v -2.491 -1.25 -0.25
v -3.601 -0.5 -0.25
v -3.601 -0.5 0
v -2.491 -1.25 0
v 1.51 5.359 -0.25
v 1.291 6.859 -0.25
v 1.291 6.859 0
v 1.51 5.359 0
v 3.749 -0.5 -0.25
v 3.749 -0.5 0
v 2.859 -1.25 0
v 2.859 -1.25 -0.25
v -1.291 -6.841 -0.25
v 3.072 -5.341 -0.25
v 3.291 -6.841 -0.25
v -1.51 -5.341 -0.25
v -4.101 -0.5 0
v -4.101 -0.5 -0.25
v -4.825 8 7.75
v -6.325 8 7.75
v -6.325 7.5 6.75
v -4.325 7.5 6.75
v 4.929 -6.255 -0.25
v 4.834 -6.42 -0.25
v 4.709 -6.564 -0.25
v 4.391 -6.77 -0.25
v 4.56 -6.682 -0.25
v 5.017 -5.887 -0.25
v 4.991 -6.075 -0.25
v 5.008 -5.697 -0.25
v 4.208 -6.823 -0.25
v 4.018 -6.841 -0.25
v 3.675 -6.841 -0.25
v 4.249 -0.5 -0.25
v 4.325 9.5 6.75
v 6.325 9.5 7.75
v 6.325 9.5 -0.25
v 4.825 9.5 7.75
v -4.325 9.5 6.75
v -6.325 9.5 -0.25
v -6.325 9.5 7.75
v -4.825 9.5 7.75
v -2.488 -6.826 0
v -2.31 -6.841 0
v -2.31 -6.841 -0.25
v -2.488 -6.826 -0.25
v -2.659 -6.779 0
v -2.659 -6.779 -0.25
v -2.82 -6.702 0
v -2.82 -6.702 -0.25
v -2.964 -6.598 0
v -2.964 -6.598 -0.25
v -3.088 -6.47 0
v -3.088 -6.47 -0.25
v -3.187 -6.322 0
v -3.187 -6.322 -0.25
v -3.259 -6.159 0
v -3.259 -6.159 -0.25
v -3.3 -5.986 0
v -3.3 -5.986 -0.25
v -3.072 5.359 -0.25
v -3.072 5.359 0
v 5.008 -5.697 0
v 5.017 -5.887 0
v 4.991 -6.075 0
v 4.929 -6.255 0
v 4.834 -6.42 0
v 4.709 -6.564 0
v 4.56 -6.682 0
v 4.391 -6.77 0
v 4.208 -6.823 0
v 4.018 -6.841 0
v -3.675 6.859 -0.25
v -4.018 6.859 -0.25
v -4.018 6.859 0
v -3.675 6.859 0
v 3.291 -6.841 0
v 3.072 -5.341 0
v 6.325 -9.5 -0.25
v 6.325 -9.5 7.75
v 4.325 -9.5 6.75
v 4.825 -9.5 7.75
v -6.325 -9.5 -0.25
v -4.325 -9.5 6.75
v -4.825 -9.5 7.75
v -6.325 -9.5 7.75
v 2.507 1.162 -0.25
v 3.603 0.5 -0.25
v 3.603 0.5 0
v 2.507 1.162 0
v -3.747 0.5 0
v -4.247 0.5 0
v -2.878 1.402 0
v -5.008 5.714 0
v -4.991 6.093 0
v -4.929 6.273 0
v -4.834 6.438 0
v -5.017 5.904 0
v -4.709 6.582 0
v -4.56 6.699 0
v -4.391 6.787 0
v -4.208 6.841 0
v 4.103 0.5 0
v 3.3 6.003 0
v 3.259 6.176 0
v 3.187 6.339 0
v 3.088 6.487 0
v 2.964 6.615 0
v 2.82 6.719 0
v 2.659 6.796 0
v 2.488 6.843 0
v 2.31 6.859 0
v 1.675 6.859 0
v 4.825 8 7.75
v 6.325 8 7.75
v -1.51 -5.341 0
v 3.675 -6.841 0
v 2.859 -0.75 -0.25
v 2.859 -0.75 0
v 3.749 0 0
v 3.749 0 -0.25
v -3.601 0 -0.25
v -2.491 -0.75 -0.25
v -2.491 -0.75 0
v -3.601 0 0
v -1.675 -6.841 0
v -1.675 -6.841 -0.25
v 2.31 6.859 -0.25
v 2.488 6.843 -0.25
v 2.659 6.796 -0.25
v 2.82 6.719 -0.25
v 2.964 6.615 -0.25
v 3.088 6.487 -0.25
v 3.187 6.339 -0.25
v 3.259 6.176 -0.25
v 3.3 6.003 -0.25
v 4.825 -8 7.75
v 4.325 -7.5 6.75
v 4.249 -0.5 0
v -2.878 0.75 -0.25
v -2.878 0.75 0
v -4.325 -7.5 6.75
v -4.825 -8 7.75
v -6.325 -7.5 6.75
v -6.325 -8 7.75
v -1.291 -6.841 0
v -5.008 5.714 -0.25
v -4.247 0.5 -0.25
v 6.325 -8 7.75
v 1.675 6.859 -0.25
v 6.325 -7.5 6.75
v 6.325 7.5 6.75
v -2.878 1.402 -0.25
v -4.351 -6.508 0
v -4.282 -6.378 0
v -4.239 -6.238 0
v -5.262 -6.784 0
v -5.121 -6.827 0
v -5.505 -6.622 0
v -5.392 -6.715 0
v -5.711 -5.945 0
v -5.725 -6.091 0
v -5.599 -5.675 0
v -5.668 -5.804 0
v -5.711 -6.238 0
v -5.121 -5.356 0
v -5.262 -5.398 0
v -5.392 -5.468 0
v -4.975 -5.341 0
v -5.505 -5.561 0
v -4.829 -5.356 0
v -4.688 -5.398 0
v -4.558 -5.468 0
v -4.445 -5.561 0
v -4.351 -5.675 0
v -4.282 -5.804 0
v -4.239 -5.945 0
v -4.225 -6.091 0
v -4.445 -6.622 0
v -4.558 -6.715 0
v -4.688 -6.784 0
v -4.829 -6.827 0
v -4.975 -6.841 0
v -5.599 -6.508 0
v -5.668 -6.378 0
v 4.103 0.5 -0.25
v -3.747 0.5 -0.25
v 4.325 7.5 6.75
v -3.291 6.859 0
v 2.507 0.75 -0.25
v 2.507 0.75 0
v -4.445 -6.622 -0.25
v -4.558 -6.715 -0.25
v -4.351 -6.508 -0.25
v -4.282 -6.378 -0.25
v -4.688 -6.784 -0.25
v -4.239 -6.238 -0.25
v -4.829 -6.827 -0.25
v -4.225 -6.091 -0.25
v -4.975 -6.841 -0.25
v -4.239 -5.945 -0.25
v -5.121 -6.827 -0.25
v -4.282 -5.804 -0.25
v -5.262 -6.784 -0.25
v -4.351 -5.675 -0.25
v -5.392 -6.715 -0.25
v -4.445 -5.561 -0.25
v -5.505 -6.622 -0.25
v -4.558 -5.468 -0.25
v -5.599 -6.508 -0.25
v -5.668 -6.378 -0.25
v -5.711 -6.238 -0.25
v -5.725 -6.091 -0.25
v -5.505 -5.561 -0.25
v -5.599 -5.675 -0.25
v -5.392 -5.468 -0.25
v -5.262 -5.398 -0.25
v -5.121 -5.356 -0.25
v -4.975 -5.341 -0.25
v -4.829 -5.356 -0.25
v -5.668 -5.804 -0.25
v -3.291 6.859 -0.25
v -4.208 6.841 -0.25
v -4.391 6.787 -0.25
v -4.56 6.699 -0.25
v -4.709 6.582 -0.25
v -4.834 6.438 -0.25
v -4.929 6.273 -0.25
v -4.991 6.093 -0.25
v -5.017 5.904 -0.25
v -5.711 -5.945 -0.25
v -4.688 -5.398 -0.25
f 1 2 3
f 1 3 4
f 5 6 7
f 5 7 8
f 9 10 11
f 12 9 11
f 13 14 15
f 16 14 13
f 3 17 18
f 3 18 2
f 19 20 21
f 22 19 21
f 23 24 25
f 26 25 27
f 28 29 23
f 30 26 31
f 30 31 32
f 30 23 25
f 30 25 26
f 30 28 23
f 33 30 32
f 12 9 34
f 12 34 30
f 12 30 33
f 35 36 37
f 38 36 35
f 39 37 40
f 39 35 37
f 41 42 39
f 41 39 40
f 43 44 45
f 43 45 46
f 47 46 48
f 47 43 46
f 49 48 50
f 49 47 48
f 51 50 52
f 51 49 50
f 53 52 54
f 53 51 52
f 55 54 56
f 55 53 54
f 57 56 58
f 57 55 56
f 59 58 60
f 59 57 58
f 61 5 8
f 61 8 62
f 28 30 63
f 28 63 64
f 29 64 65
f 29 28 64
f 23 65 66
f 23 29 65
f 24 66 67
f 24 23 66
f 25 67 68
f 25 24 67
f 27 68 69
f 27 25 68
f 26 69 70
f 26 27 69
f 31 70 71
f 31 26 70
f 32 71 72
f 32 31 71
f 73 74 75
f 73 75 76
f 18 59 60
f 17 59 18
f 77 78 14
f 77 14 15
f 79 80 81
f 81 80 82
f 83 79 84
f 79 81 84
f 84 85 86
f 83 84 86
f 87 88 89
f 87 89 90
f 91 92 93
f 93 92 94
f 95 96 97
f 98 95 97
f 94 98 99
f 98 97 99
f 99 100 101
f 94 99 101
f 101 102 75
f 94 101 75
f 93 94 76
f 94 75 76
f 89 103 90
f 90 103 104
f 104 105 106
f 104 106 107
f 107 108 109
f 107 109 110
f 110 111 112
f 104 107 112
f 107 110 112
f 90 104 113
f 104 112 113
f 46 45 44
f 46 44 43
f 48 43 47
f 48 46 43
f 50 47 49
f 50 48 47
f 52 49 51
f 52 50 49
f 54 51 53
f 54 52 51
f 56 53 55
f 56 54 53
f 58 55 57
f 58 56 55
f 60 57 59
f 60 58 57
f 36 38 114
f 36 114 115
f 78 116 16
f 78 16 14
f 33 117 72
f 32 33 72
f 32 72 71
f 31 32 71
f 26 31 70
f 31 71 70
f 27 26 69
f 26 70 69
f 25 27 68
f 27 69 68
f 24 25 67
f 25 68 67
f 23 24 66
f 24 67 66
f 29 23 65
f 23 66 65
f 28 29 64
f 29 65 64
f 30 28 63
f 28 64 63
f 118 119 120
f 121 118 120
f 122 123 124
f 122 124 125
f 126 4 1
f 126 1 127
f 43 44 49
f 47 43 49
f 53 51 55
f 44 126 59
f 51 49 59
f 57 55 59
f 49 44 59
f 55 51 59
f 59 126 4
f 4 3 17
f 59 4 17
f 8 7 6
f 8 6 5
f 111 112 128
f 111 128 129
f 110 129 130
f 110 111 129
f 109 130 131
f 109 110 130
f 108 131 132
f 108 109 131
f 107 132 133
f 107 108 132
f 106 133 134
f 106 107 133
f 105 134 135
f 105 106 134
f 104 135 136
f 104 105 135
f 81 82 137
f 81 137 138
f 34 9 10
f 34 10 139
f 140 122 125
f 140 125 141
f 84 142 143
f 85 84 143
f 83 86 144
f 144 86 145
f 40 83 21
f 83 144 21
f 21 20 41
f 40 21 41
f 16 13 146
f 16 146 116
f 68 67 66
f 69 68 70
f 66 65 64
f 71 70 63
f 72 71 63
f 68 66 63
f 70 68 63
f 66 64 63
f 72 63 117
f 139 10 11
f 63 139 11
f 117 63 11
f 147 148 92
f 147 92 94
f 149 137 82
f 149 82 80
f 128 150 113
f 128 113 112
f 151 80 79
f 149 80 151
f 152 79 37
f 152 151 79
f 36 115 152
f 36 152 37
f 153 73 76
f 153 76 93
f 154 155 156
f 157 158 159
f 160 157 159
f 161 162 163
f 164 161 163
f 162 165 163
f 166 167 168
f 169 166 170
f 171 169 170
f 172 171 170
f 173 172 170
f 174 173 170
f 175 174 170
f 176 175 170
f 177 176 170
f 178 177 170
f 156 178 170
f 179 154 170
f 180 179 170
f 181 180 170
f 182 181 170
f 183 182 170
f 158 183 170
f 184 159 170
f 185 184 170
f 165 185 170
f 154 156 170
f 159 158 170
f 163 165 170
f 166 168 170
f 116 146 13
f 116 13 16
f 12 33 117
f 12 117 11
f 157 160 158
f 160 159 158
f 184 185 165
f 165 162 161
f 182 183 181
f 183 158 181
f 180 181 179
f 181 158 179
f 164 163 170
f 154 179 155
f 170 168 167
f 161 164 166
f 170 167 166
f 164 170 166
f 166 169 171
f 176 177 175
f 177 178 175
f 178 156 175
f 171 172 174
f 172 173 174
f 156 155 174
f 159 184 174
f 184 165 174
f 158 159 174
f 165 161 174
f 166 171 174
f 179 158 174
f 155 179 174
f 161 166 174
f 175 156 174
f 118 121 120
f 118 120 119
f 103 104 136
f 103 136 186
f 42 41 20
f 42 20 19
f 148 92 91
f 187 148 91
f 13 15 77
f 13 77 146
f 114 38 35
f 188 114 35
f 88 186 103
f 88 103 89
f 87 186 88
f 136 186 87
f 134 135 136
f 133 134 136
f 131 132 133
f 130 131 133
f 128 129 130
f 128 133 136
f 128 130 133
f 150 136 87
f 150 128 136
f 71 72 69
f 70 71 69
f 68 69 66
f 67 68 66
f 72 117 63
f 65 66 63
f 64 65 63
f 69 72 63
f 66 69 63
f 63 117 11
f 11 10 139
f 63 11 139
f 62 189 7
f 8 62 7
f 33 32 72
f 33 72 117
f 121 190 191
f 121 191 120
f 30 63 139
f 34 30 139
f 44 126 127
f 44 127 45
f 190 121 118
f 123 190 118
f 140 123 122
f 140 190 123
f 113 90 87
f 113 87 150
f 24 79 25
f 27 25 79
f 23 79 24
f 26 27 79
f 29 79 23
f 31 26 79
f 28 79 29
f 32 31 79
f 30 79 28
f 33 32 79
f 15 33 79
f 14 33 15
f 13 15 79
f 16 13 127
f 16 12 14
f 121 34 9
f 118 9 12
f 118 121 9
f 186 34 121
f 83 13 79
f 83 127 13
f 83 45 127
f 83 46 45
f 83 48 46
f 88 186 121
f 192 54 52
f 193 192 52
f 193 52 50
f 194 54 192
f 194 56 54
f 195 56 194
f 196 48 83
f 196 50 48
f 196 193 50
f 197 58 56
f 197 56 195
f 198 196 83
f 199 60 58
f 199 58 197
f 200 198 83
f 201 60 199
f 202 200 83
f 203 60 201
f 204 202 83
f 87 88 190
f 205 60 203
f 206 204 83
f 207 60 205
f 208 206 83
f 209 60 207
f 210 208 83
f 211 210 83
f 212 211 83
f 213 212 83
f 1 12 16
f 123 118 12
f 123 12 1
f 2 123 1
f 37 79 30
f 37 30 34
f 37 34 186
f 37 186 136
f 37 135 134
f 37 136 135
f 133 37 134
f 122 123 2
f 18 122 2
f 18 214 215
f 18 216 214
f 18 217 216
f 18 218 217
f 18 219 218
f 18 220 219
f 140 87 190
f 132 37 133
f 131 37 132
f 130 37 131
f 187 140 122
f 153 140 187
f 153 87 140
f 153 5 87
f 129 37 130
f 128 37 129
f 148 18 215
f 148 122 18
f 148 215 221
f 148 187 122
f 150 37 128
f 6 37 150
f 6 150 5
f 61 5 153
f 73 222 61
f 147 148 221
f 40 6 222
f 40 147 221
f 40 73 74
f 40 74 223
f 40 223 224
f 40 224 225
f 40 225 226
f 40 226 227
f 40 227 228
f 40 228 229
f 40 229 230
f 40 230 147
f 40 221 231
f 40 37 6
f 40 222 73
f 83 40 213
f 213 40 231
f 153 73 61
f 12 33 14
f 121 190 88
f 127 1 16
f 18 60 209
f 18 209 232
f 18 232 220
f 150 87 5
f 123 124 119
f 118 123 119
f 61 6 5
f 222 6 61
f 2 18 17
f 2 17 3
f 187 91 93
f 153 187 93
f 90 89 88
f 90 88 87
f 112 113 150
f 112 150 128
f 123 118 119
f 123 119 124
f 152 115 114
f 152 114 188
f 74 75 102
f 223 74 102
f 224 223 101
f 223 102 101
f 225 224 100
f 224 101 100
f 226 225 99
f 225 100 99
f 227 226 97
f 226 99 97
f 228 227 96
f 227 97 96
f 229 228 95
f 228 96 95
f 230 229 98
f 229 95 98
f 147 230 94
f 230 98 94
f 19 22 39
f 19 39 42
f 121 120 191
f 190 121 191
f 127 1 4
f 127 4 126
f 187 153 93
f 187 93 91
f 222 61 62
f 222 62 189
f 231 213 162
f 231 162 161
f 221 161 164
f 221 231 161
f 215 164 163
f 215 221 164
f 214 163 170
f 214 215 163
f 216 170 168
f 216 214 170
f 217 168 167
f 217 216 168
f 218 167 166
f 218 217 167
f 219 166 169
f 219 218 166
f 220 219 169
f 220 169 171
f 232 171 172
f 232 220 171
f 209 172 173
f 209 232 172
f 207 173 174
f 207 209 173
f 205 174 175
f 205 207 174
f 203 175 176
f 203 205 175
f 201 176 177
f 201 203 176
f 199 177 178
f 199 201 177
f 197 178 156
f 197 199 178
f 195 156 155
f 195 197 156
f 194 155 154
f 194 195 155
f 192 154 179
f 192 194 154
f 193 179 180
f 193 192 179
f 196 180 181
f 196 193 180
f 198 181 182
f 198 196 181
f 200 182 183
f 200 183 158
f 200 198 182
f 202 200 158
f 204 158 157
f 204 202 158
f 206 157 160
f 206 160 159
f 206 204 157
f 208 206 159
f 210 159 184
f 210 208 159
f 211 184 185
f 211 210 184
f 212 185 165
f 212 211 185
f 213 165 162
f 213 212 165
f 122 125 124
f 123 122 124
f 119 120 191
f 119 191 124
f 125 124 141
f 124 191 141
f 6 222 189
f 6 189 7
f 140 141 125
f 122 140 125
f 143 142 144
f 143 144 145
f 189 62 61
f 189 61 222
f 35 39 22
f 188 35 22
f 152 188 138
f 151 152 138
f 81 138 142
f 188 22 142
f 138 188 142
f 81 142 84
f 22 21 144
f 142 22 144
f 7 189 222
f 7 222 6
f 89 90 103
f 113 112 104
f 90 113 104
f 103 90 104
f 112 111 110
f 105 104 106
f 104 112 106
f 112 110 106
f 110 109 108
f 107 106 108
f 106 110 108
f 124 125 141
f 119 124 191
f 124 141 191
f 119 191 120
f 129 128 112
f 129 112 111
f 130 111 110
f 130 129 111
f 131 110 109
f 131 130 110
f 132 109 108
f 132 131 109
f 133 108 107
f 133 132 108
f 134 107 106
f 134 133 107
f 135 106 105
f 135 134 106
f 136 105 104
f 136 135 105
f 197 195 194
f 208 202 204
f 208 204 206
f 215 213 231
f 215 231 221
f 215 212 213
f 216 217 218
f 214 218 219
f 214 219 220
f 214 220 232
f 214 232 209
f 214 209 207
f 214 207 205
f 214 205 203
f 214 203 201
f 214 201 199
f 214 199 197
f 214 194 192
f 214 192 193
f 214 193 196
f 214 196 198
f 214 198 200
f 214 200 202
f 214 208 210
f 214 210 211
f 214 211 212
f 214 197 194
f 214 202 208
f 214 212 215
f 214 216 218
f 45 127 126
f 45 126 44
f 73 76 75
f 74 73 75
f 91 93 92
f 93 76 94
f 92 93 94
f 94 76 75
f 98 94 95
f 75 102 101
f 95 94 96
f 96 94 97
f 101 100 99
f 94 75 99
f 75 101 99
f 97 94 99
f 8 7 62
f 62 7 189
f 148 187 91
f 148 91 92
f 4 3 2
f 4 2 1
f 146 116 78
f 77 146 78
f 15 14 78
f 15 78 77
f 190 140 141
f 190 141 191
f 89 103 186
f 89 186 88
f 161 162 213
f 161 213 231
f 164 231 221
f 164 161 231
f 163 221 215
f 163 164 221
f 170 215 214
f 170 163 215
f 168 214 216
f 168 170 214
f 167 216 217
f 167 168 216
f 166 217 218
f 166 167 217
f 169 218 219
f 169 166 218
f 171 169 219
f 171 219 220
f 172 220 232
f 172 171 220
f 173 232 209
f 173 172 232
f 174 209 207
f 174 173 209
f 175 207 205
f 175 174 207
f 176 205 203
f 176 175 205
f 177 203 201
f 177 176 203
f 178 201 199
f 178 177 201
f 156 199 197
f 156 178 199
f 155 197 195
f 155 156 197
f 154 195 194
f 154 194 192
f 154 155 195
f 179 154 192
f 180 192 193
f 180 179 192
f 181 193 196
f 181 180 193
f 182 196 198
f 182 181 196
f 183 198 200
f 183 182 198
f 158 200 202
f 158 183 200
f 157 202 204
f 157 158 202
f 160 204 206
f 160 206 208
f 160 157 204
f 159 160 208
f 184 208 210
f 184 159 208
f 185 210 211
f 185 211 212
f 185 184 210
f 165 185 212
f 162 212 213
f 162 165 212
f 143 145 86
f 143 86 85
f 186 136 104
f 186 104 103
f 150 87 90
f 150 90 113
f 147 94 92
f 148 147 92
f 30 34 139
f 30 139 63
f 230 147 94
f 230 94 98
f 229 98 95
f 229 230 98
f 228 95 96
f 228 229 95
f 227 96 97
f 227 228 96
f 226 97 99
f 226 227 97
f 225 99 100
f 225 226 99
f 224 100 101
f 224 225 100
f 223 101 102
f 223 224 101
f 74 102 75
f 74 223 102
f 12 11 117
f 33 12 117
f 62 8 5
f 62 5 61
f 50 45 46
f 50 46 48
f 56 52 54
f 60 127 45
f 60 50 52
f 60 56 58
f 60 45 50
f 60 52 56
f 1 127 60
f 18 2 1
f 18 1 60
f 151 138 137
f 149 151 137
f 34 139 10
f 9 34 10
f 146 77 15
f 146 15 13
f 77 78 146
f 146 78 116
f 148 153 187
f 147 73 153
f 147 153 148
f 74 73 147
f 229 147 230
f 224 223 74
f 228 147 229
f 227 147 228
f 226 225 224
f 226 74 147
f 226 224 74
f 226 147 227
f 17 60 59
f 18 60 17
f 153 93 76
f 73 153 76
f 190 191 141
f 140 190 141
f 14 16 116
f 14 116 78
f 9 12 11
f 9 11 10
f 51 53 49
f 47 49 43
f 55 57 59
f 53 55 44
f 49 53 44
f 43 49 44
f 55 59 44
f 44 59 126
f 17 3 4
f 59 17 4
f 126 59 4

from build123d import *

# Parameters (mm, degrees)
IZIM1_W                       = 12.65
IZIM1_H                       = 19
Y_KSEKLIK_EKSTR_ZYON1_DEPTH   = 7.75
KES_EKSTR_ZYON1_DEPTH         = 20
KES_EKSTR_ZYON2_DEPTH         = 13.65
IZIM4_W                       = 12.35
IZIM4_H                       = 18.7
IZIM4_R                       = 0.75
Y_KSEKLIK_EKSTR_ZYON2_DEPTH   = 0.25
IZIM5_R                       = 0.75
Y_KSEKLIK_EKSTR_ZYON3_DEPTH   = 0.25
Y_KSEKLIK_EKSTR_ZYON3_2_DEPTH = 0.25
Y_KSEKLIK_EKSTR_ZYON3_3_DEPTH = 0.25
Y_KSEKLIK_EKSTR_ZYON3_4_DEPTH = 0.25
Y_KSEKLIK_EKSTR_ZYON3_5_DEPTH = 0.25
Y_KSEKLIK_EKSTR_ZYON3_6_DEPTH = 0.25
Y_KSEKLIK_EKSTR_ZYON3_7_DEPTH = 0.25
Y_KSEKLIK_EKSTR_ZYON3_8_DEPTH = 0.25
IZIM6_W                       = 12.65
IZIM6_H                       = 19
IZIM6_W_2                     = 12.35
IZIM6_H_2                     = 18.7
Y_KSEKLIK_EKSTR_ZYON4_DEPTH   = 0.25


with BuildPart() as part:
    # Çizim1 → Yükseklik-Ekstrüzyon1 (new body)
    with BuildSketch(Plane.XY):
        Rectangle(IZIM1_W, IZIM1_H)
    extrude(amount=Y_KSEKLIK_EKSTR_ZYON1_DEPTH)

    # Çizim2 → Kes-Ekstrüzyon1 (cut, through all)
    with BuildSketch(Plane(origin=(0, 9.5, 0), x_dir=(1, 0, 0), z_dir=(0, 1, 0))):
        Polygon((-4.325, -6.75), (-4.825, -7.75), (4.825, -7.75), (4.325, -6.75), align=None)
    extrude(amount=-KES_EKSTR_ZYON1_DEPTH, mode=Mode.SUBTRACT)

    # Çizim3 → Kes-Ekstrüzyon2 (cut, through all)
    with BuildSketch(Plane.ZY.offset(6.325)):
        Polygon((7.75, 8), (6.75, 7.5), (6.75, -7.5), (7.75, -8), align=None)
    extrude(amount=-KES_EKSTR_ZYON2_DEPTH, mode=Mode.SUBTRACT)



with BuildPart() as body_2:
    # Çizim4 → Yükseklik-Ekstrüzyon2 (new body)
    with BuildSketch(Plane(origin=(0, 0, 0), x_dir=(-1, 0, 0), z_dir=(0, 0, -1))):
        with Locations((0, 0.008624693)):
            Rectangle(IZIM4_W, IZIM4_H)
        with Locations((4.975, -6.091375307)):
            Circle(IZIM4_R, mode=Mode.SUBTRACT)
        with BuildLine():
            Line((5.00792639, 5.714170462), (4.246733621, 0.5))
            Line((4.246733621, 0.5), (3.746733621, 0.5))
            Line((3.746733621, 0.5), (2.878348659, 1.401563009))
            Line((2.878348659, 1.401563009), (3.675, 6.858624693))
            Line((3.675, 6.858624693), (4.018414907, 6.858624693))
            ThreePointArc((4.018414907, 6.858624693), (4.774871855, 6.512668181), (5.00792639, 5.714170462))
        make_face(mode=Mode.SUBTRACT)
        with BuildLine():
            Line((1.675, -6.841375307), (2.310385709, -6.841375307))
            ThreePointArc((2.310385709, -6.841375307), (2.964429198, -6.597832256), (3.299897193, -5.985829538))
            Line((3.299897193, -5.985829538), (4.10074822, -0.5))
            Line((4.10074822, -0.5), (3.60074822, -0.5))
            Line((3.60074822, -0.5), (2.491259169, -1.25))
            Line((2.491259169, -1.25), (1.675, -6.841375307))
        make_face(mode=Mode.SUBTRACT)
        with BuildLine():
            Line((-3.299897193, 6.003078924), (-4.103266379, 0.5))
            Line((-4.103266379, 0.5), (-3.603266379, 0.5))
            Line((-3.603266379, 0.5), (-2.506640402, 1.161887938))
            Line((-2.506640402, 1.161887938), (-1.675, 6.858624693))
            Line((-1.675, 6.858624693), (-2.310385709, 6.858624693))
            ThreePointArc((-2.310385709, 6.858624693), (-2.964429198, 6.615081642), (-3.299897193, 6.003078924))
        make_face(mode=Mode.SUBTRACT)
        with BuildLine():
            Line((-5.00792639, -5.696921076), (-4.24925178, -0.5))
            Line((-4.24925178, -0.5), (-3.74925178, -0.5))
            Line((-3.74925178, -0.5), (-2.858740831, -1.25))
            Line((-2.858740831, -1.25), (-3.675, -6.841375307))
            Line((-3.675, -6.841375307), (-4.018414907, -6.841375307))
            ThreePointArc((-4.018414907, -6.841375307), (-4.774871855, -6.495418795), (-5.00792639, -5.696921076))
        make_face(mode=Mode.SUBTRACT)
        Polygon((-3.071994015, -5.341375307), (-3.290972117, -6.841375307), (1.290972117, -6.841375307), (1.509950219, -5.341375307), align=None, mode=Mode.SUBTRACT)
        Polygon((-2.506640402, 0.75), (2.878348659, 0.75), (3.60074822, 0), (2.491259169, -0.75), (-2.858740831, -0.75), (-3.74925178, 0), align=None, mode=Mode.SUBTRACT)
        Polygon((-1.290972117, 6.858624693), (-1.509950219, 5.358624693), (3.071994015, 5.358624693), (3.290972117, 6.858624693), align=None, mode=Mode.SUBTRACT)
    extrude(amount=Y_KSEKLIK_EKSTR_ZYON2_DEPTH)


with BuildPart() as body_3:
    # Çizim5 → Yükseklik-Ekstrüzyon3 (new body)
    with BuildSketch(Plane(origin=(0, 0, -0.25), x_dir=(-1, 0, 0), z_dir=(0, 0, -1))):
        with Locations((4.975, -6.091375307)):
            Circle(IZIM5_R)
    extrude(amount=-Y_KSEKLIK_EKSTR_ZYON3_DEPTH)


with BuildPart() as body_4:
    # Çizim5 → Y_kseklik-Ekstr_zyon3 2 (new body)
    with BuildSketch(Plane(origin=(0, 0, -0.25), x_dir=(-1, 0, 0), z_dir=(0, 0, -1))):
        Polygon((3.290972117, 6.858624693), (-1.290972117, 6.858624693), (-1.509950219, 5.358624693), (3.071994015, 5.358624693), align=None)
    extrude(amount=-Y_KSEKLIK_EKSTR_ZYON3_2_DEPTH)


with BuildPart() as body_5:
    # Çizim5 → Y_kseklik-Ekstr_zyon3 3 (new body)
    with BuildSketch(Plane(origin=(0, 0, -0.25), x_dir=(-1, 0, 0), z_dir=(0, 0, -1))):
        with BuildLine():
            Line((-2.506640402, 1.161887938), (-1.675, 6.858624693))
            Line((-1.675, 6.858624693), (-2.310385709, 6.858624693))
            ThreePointArc((-2.310385709, 6.858624693), (-2.964429198, 6.615081642), (-3.299897193, 6.003078924))
            Line((-3.299897193, 6.003078924), (-4.103266379, 0.5))
            Line((-4.103266379, 0.5), (-3.603266379, 0.5))
            Line((-3.603266379, 0.5), (-2.506640402, 1.161887938))
        make_face()
    extrude(amount=-Y_KSEKLIK_EKSTR_ZYON3_3_DEPTH)


with BuildPart() as body_6:
    # Çizim5 → Y_kseklik-Ekstr_zyon3 4 (new body)
    with BuildSketch(Plane(origin=(0, 0, -0.25), x_dir=(-1, 0, 0), z_dir=(0, 0, -1))):
        Polygon((-2.506640402, 0.75), (-3.74925178, 0), (-2.858740831, -0.75), (2.491259169, -0.75), (3.60074822, 0), (2.878348659, 0.75), align=None)
    extrude(amount=-Y_KSEKLIK_EKSTR_ZYON3_4_DEPTH)


with BuildPart() as body_7:
    # Çizim5 → Y_kseklik-Ekstr_zyon3 5 (new body)
    with BuildSketch(Plane(origin=(0, 0, -0.25), x_dir=(-1, 0, 0), z_dir=(0, 0, -1))):
        with BuildLine():
            Line((-2.858740831, -1.25), (-3.74925178, -0.5))
            Line((-3.74925178, -0.5), (-4.24925178, -0.5))
            Line((-4.24925178, -0.5), (-5.00792639, -5.696921076))
            ThreePointArc((-5.00792639, -5.696921076), (-4.774871855, -6.495418795), (-4.018414907, -6.841375307))
            Line((-4.018414907, -6.841375307), (-3.675, -6.841375307))
            Line((-3.675, -6.841375307), (-2.858740831, -1.25))
        make_face()
    extrude(amount=-Y_KSEKLIK_EKSTR_ZYON3_5_DEPTH)


with BuildPart() as body_8:
    # Çizim5 → Y_kseklik-Ekstr_zyon3 6 (new body)
    with BuildSketch(Plane(origin=(0, 0, -0.25), x_dir=(-1, 0, 0), z_dir=(0, 0, -1))):
        with BuildLine():
            Line((3.675, 6.858624693), (2.878348659, 1.401563009))
            Line((2.878348659, 1.401563009), (3.746733621, 0.5))
            Line((3.746733621, 0.5), (4.246733621, 0.5))
            Line((4.246733621, 0.5), (5.00792639, 5.714170462))
            ThreePointArc((5.00792639, 5.714170462), (4.774871855, 6.512668181), (4.018414907, 6.858624693))
            Line((4.018414907, 6.858624693), (3.675, 6.858624693))
        make_face()
    extrude(amount=-Y_KSEKLIK_EKSTR_ZYON3_6_DEPTH)


with BuildPart() as body_9:
    # Çizim5 → Y_kseklik-Ekstr_zyon3 7 (new body)
    with BuildSketch(Plane(origin=(0, 0, -0.25), x_dir=(-1, 0, 0), z_dir=(0, 0, -1))):
        with BuildLine():
            Line((3.60074822, -0.5), (2.491259169, -1.25))
            Line((2.491259169, -1.25), (1.675, -6.841375307))
            Line((1.675, -6.841375307), (2.310385709, -6.841375307))
            ThreePointArc((2.310385709, -6.841375307), (2.964429198, -6.597832256), (3.299897193, -5.985829538))
            Line((3.299897193, -5.985829538), (4.10074822, -0.5))
            Line((4.10074822, -0.5), (3.60074822, -0.5))
        make_face()
    extrude(amount=-Y_KSEKLIK_EKSTR_ZYON3_7_DEPTH)


with BuildPart() as body_10:
    # Çizim5 → Y_kseklik-Ekstr_zyon3 8 (new body)
    with BuildSketch(Plane(origin=(0, 0, -0.25), x_dir=(-1, 0, 0), z_dir=(0, 0, -1))):
        Polygon((-3.071994015, -5.341375307), (-3.290972117, -6.841375307), (1.290972117, -6.841375307), (1.509950219, -5.341375307), align=None)
    extrude(amount=-Y_KSEKLIK_EKSTR_ZYON3_8_DEPTH)


with BuildPart() as part_1:
    add(part.part)

    add(body_2.part)  # Yükseklik-Ekstrüzyon4 merges body 2
    # Çizim6 → Yükseklik-Ekstrüzyon4 (add, through all)
    with BuildSketch(Plane(origin=(0, 0, 0), x_dir=(-1, 0, 0), z_dir=(0, 0, -1))):
        Rectangle(IZIM6_W, IZIM6_H)
        with Locations((0, 0.008624693)):
            Rectangle(IZIM6_W_2, IZIM6_H_2, mode=Mode.SUBTRACT)
    extrude(amount=Y_KSEKLIK_EKSTR_ZYON4_DEPTH)


solid = Compound([body_3.part, body_4.part, body_5.part, body_6.part, body_7.part, body_8.part, body_9.part, body_10.part, part_1.part])
